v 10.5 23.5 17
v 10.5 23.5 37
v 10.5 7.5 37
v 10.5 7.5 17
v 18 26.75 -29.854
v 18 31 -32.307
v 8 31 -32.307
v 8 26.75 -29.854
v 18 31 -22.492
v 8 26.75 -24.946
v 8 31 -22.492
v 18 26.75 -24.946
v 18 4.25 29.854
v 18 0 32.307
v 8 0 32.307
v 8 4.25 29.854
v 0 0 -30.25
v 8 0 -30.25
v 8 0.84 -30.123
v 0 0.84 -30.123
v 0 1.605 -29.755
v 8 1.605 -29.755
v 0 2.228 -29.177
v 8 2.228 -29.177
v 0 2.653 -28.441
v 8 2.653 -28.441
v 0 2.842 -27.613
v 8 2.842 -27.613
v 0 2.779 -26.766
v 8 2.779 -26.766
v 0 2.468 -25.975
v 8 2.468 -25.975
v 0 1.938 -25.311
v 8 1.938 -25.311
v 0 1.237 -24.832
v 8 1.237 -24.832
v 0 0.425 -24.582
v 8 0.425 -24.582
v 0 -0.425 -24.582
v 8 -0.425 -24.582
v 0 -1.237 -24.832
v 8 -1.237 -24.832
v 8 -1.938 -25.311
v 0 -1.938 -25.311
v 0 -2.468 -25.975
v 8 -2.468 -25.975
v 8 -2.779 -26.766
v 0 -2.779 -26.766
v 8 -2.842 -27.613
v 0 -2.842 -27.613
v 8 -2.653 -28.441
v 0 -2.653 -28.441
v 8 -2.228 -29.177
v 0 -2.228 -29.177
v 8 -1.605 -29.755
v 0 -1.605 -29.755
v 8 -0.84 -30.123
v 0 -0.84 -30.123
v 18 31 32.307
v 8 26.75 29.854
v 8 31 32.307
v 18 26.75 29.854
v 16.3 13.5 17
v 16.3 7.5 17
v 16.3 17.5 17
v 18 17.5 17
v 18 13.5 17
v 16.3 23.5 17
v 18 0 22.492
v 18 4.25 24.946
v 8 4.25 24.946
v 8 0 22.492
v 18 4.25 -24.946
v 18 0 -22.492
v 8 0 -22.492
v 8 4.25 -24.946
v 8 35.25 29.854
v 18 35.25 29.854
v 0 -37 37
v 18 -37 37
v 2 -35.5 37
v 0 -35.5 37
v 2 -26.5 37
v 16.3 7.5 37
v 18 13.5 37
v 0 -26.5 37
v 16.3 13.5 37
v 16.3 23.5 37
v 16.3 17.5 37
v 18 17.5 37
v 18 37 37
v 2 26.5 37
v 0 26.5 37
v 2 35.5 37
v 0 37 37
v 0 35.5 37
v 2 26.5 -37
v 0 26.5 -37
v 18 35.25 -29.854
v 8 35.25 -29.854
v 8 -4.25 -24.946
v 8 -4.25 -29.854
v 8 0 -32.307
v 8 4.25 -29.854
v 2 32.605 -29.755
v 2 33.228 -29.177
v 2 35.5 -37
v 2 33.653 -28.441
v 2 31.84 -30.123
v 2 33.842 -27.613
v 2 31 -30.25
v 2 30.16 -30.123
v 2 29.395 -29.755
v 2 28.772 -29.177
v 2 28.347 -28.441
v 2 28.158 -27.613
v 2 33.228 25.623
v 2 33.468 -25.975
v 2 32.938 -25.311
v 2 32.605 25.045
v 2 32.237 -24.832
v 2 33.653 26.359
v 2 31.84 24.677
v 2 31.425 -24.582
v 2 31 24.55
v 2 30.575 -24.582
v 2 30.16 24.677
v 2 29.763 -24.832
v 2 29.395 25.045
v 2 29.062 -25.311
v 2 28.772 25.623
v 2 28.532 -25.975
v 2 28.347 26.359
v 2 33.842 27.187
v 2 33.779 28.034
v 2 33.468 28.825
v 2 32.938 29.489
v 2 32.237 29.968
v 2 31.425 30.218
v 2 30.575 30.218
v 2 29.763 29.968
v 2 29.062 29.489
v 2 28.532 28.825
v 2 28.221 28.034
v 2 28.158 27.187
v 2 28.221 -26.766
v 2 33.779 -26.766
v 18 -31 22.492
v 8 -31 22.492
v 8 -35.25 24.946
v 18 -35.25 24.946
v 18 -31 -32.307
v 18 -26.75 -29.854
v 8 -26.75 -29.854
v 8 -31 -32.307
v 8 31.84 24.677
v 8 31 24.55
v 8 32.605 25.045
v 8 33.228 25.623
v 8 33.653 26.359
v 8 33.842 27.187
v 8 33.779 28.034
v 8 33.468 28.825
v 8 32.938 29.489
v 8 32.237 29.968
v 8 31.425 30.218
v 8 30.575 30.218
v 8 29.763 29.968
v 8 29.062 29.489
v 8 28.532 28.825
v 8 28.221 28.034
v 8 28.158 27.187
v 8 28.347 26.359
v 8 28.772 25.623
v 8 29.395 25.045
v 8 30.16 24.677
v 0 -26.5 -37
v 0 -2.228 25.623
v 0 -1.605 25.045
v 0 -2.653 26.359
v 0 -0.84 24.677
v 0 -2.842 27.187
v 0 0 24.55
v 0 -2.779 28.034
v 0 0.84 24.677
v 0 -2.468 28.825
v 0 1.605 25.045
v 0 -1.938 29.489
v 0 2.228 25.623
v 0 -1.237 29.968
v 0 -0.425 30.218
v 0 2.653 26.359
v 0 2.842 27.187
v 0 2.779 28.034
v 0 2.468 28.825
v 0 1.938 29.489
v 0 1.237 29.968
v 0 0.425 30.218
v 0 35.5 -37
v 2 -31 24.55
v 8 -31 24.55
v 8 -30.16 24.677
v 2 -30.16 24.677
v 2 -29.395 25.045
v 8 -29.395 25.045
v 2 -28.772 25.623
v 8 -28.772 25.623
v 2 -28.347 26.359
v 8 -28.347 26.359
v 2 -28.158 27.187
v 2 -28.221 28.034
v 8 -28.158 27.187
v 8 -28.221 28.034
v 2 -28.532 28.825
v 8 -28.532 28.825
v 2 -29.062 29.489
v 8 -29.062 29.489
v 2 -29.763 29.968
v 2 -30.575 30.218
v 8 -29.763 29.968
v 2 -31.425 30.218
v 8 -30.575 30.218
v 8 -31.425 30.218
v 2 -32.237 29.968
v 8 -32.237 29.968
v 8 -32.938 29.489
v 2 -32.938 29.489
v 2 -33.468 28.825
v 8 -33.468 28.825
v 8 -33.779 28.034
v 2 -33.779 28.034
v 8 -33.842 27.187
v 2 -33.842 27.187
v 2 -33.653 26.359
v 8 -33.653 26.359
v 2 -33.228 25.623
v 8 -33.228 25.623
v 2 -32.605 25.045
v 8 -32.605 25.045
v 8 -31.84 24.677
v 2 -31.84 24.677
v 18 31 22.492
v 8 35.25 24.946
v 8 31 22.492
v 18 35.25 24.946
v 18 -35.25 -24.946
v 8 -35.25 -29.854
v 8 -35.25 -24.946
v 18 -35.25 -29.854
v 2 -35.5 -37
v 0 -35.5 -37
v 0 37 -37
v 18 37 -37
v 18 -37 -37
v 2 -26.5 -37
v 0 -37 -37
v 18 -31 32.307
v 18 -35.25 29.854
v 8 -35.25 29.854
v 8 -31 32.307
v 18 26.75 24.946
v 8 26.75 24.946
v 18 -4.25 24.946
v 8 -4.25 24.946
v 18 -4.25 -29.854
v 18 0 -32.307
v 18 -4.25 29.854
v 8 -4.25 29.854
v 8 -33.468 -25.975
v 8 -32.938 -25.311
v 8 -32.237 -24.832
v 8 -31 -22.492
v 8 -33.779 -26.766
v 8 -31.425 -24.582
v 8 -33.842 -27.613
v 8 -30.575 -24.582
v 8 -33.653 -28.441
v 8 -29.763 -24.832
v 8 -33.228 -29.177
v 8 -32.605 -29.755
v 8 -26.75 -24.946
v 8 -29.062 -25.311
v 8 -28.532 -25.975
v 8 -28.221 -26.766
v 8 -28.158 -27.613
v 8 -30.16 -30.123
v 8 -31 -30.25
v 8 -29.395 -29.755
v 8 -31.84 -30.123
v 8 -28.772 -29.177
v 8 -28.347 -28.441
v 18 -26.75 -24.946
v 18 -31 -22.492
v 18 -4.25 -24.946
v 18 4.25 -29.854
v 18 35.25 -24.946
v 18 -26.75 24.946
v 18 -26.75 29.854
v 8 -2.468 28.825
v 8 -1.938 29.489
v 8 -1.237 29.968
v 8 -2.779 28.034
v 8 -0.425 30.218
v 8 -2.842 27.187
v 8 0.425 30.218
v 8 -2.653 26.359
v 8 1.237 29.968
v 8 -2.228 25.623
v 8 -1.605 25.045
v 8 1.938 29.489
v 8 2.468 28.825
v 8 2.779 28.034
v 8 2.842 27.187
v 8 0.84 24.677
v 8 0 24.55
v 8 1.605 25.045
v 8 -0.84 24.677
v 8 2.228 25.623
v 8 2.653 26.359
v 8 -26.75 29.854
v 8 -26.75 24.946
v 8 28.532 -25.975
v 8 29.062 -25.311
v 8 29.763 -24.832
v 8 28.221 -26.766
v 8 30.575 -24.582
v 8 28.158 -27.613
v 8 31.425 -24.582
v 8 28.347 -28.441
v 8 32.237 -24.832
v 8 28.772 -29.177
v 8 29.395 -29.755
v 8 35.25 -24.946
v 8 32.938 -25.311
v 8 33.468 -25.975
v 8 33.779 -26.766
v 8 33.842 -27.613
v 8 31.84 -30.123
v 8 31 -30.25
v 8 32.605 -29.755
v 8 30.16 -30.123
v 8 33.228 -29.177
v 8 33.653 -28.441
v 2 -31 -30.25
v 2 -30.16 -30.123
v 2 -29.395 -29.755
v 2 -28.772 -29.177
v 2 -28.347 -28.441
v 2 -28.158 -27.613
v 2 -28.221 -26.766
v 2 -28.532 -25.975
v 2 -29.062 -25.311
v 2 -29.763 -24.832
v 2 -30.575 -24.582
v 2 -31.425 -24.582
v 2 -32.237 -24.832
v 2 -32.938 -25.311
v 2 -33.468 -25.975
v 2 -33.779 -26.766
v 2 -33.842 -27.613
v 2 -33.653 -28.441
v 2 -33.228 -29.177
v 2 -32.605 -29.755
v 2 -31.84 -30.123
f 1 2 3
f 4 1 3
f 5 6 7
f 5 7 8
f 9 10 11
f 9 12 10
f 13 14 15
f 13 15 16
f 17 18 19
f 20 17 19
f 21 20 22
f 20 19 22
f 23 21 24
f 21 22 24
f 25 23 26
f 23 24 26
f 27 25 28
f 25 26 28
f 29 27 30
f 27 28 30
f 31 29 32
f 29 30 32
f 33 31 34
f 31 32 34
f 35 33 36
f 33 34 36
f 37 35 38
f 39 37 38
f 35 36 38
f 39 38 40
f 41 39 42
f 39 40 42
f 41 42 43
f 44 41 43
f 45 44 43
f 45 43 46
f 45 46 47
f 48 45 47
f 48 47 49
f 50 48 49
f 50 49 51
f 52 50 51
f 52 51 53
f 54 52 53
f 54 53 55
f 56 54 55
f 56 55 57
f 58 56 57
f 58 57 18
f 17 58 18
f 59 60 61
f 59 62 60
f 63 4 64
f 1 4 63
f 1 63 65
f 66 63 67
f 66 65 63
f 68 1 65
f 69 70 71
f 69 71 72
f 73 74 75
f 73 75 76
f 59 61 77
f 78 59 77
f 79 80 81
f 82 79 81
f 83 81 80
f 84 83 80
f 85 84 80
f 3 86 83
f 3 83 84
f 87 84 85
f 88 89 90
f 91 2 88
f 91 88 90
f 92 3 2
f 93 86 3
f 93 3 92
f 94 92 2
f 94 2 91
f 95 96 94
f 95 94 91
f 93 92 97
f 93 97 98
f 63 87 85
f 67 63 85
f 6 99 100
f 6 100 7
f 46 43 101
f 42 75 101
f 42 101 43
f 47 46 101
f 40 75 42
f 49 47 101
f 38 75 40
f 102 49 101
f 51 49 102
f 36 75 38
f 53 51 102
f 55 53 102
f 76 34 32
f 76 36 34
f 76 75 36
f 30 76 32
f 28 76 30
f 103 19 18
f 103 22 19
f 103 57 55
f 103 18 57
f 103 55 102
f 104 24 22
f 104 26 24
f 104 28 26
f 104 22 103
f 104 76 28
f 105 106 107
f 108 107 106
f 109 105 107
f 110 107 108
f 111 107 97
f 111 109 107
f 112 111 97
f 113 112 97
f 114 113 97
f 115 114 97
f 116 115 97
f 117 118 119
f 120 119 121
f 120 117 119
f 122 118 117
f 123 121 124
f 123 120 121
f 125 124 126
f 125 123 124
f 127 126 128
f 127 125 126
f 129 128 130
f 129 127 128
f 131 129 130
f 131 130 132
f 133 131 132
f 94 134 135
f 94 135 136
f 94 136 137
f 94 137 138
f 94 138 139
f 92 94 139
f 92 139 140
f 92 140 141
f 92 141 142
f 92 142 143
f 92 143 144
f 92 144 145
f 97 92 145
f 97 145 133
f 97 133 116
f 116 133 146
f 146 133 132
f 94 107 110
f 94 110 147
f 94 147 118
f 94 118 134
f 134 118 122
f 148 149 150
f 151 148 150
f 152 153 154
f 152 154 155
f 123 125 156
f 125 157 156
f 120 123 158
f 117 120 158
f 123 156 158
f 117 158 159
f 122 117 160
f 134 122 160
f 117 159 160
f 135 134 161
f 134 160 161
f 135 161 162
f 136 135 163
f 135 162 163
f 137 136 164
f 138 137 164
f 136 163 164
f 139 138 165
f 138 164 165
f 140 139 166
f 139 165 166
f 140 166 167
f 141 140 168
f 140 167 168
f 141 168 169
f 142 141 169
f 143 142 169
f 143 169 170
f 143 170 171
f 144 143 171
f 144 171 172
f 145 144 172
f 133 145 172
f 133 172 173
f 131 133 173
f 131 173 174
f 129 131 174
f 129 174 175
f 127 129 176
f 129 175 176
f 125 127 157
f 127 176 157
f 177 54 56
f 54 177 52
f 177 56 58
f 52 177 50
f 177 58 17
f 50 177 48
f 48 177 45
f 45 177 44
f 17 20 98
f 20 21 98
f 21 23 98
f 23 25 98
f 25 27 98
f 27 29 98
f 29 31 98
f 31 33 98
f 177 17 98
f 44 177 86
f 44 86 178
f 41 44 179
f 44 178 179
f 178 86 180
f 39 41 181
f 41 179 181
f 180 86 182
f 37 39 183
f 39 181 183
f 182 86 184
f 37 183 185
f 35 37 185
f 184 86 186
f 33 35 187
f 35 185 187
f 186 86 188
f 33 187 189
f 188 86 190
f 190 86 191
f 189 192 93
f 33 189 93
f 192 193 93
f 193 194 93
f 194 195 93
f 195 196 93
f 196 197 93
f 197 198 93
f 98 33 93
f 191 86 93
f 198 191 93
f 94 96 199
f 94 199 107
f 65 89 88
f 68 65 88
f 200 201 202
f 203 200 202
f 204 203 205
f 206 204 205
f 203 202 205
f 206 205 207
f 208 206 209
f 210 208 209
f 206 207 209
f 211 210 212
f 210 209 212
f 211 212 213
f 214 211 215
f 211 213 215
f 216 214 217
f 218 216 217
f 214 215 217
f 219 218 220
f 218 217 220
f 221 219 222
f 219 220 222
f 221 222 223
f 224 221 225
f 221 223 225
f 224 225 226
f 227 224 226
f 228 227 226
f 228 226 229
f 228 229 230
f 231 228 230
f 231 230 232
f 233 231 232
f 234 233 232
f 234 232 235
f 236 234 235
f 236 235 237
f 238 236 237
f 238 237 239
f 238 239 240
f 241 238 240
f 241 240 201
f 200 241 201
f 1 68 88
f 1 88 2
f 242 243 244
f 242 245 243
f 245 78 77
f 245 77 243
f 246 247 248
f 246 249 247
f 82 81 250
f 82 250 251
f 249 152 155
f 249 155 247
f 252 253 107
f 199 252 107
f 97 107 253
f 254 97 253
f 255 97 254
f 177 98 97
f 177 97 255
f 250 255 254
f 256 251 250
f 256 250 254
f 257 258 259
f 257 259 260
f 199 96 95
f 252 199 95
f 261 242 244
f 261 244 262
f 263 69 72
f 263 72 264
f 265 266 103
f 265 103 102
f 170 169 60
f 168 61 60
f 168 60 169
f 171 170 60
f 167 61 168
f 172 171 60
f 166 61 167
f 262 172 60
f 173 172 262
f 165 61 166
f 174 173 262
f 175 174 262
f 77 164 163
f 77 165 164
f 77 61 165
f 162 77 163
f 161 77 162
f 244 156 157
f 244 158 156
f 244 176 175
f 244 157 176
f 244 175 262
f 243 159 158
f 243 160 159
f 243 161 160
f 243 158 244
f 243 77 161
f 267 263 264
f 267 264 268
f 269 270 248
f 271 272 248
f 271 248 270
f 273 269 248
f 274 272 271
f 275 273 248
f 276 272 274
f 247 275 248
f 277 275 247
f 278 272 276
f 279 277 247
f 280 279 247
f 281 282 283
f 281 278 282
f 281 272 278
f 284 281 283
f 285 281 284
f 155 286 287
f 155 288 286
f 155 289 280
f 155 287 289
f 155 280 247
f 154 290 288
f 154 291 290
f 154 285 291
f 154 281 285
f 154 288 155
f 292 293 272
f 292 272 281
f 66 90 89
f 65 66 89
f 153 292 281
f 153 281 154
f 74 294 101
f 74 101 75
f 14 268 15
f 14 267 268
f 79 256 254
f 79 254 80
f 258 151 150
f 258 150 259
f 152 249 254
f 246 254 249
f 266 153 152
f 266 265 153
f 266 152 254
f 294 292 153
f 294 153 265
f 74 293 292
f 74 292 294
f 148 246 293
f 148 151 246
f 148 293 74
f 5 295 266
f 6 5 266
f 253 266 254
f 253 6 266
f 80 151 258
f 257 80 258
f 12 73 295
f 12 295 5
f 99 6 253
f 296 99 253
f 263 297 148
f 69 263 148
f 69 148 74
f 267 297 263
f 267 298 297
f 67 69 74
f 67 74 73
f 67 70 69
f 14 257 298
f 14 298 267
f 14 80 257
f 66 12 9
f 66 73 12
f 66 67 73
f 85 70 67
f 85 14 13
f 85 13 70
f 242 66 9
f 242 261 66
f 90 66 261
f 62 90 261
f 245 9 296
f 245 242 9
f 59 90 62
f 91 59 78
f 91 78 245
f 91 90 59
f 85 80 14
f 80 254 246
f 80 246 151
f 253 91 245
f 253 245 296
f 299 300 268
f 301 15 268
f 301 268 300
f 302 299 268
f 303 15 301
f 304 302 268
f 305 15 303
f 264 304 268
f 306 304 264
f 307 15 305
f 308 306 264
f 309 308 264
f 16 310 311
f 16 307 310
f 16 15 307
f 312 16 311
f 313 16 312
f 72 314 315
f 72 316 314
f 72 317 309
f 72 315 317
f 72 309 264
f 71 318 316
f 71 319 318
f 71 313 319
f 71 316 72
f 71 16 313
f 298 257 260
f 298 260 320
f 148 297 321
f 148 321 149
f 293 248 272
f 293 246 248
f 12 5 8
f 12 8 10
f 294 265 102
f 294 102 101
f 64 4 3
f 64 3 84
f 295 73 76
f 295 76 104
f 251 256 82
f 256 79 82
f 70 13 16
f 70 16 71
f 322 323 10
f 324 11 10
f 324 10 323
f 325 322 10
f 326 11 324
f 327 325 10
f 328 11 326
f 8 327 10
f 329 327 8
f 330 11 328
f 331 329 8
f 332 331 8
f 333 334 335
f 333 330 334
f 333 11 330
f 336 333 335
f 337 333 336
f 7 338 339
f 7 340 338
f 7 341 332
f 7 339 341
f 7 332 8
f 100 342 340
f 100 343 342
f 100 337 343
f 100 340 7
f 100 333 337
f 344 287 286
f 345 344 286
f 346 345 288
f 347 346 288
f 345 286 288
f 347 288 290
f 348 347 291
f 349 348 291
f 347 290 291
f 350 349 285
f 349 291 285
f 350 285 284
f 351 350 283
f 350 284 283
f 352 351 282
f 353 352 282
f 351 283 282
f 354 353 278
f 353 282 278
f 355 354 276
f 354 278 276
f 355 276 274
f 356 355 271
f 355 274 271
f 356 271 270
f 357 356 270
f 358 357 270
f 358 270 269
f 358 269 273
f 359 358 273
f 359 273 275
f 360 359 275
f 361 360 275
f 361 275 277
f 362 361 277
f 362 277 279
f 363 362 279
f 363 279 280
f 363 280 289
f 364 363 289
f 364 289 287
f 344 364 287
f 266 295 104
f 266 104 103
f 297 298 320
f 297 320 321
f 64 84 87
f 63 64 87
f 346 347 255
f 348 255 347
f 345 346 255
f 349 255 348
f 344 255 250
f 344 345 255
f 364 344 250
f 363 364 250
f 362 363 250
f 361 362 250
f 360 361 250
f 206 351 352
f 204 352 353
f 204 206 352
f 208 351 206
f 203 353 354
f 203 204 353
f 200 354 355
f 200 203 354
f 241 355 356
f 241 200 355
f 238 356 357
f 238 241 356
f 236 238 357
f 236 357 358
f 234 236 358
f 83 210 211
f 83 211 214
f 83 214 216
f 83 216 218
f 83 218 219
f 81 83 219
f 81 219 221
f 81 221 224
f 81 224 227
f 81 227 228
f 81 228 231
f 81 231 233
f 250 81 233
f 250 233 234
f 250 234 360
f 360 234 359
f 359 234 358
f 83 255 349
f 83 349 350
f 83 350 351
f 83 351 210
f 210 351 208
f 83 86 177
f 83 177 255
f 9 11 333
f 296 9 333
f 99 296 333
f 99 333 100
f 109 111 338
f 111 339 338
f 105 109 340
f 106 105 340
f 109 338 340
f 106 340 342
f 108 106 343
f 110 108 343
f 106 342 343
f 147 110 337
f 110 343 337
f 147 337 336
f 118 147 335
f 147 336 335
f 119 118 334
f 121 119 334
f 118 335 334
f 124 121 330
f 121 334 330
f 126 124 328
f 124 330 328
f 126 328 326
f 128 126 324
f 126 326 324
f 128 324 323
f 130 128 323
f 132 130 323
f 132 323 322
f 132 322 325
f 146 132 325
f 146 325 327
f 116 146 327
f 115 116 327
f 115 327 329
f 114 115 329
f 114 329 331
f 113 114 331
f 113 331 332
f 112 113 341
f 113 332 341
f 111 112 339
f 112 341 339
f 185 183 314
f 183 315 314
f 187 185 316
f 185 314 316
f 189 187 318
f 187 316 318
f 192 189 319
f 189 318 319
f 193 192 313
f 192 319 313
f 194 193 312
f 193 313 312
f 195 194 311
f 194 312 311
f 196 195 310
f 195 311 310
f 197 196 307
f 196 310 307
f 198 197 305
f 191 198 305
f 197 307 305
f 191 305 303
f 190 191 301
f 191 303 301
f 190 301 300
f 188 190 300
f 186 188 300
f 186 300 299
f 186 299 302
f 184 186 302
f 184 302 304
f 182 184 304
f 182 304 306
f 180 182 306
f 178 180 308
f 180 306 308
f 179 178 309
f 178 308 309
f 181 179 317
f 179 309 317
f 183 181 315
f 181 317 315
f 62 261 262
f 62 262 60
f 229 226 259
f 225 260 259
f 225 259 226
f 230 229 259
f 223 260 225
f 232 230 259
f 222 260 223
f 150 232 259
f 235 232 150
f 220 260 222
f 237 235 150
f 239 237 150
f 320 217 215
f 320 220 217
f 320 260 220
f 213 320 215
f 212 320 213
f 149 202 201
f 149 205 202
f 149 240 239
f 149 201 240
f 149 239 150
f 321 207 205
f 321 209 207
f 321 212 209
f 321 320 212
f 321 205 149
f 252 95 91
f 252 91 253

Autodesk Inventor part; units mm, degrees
ref_plane "YZ Plane" through (0, 0, 0) normal (1, 0, 0) x (0, 1, 0)
ref_plane "XZ Plane" through (0, 0, 0) normal (0, 1, 0) x (-1, 0, 0)
ref_plane "XY Plane" through (0, 0, 0) normal (0, 0, 1) x (1, 0, 0)
sketch "Szkic1" plane through (0, 0, 0) normal (1, 0, 0) x (0, 1, 0)
  line L0 (-37, 37) -> (37, 37)
  line L1 (37, 37) -> (37, -37)
  line L2 (37, -37) -> (-37, -37)
  line L3 (-37, -37) -> (-37, 37)
  line L4 (-37, 37) -> (37, -37) construction
  line L5 (37, 37) -> (-37, -37) construction
  point P0 (0, 0)
  dimension "d0" = 74
  dimension "d1" = 74
extrude "Wyciągnięcie proste1" add sketch "Szkic1" along normal blind 18
sketch "Szkic2" plane through (18, 0, 0) normal (1, 0, 0) x (0, 0, -1)
  circle A0 centre (-27.4, 31) radius 2.85
  line L0 (37, 37) -> (-37, 37) projected
  line L1 (-37, 37) -> (-37, -37) projected
  circle A1 centre (-27.4, 0) radius 2.85
  circle A2 centre (-27.4, -31) radius 2.85
  circle A3 centre (27.4, 31) radius 2.85
  line L2 (37, -37) -> (37, 37) projected
  circle A4 centre (27.4, 0) radius 2.85
  circle A5 centre (27.4, -31) radius 2.85
  line L3 (-29.8537, 35.25) -> (-24.9463, 35.25)
  line L4 (-24.9463, 35.25) -> (-22.4925, 31)
  line L5 (-22.4925, 31) -> (-24.9463, 26.75)
  line L6 (-24.9463, 26.75) -> (-29.8537, 26.75)
  line L7 (-29.8537, 26.75) -> (-32.3075, 31)
  line L8 (-32.3075, 31) -> (-29.8537, 35.25)
  line L9 (-29.8537, 4.25) -> (-24.9463, 4.25)
  line L10 (-24.9463, 4.25) -> (-22.4925, 0)
  line L11 (-22.4925, 0) -> (-24.9463, -4.25)
  line L12 (-24.9463, -4.25) -> (-29.8537, -4.25)
  line L13 (-29.8537, -4.25) -> (-32.3075, 0)
  line L14 (-32.3075, 0) -> (-29.8537, 4.25)
  line L15 (-29.8537, -26.75) -> (-24.9463, -26.75)
  line L16 (-24.9463, -26.75) -> (-22.4925, -31)
  line L17 (-22.4925, -31) -> (-24.9463, -35.25)
  line L18 (-24.9463, -35.25) -> (-29.8537, -35.25)
  line L19 (-29.8537, -35.25) -> (-32.3075, -31)
  line L20 (-32.3075, -31) -> (-29.8537, -26.75)
  line L21 (29.8537, 35.25) -> (32.3075, 31)
  line L22 (32.3075, 31) -> (29.8537, 26.75)
  line L23 (29.8537, 26.75) -> (24.9463, 26.75)
  line L24 (24.9463, 26.75) -> (22.4925, 31)
  line L25 (22.4925, 31) -> (24.9463, 35.25)
  line L26 (24.9463, 35.25) -> (29.8537, 35.25)
  line L27 (29.8537, 4.25) -> (32.3075, 0)
  line L28 (32.3075, 0) -> (29.8537, -4.25)
  line L29 (29.8537, -4.25) -> (24.9463, -4.25)
  line L30 (24.9463, -4.25) -> (22.4925, 0)
  line L31 (22.4925, 0) -> (24.9463, 4.25)
  line L32 (24.9463, 4.25) -> (29.8537, 4.25)
  line L33 (29.8537, -26.75) -> (32.3075, -31)
  line L34 (32.3075, -31) -> (29.8537, -35.25)
  line L35 (29.8537, -35.25) -> (24.9463, -35.25)
  line L36 (24.9463, -35.25) -> (22.4925, -31)
  line L37 (22.4925, -31) -> (24.9463, -26.75)
  line L38 (24.9463, -26.75) -> (29.8537, -26.75)
  point P0 (0, 0)
  point P1 (27.4, -26.75)
  dimension "d4" = 6
  dimension "d5" = 5.7
  dimension "d6" = 9.6
  dimension "d7" = 31
  dimension "d8" = 31
  dimension "d9" = 5.7
  dimension "d10" = 5.7
  dimension "d11" = 9.6
  dimension "d12" = 5.7
  dimension "d13" = 5.7
  dimension "d14" = 5.7
  dimension "d15" = 8.5
  dimension "d16" = 8.5
  dimension "d17" = 8.5
  dimension "d18" = 8.5
  dimension "d19" = 8.5
  dimension "d20" = 8.5
extrude "Wyciągnięcie proste2" cut sketch "Szkic2" against normal through all contours A0 | A1 | A2 | A3 | A4 | A5
extrude "Wyciągnięcie proste3" cut sketch "Szkic2" against normal blind 10 contours A0 | A1 | A2 | A3 | A4 | A5 | L3 L4 L5 L6 L7 L8 | L9 L10 L11 L12 L13 L14 | L15 L16 L17 L18 L19 L20 | L21 L22 L23 L24 L25 L26 | L27 L28 L29 L30 L31 L32 | L33 L34 L35 L36 L37 L38
sketch "Szkic3" plane through (0, -37, 37) normal (0, 0, 1) x (1, 0, 0)
  line L0 (0, 0) -> (0, 74) projected
  line L1 (0, 72.5) -> (2, 72.5)
  line L2 (2, 72.5) -> (2, 63.5)
  line L3 (2, 63.5) -> (0, 63.5)
  line L4 (0, 63.5) -> (0, 72.5)
  line L5 (0, 74) -> (18, 74) projected
  line L6 (0, 10.5) -> (2, 10.5)
  line L7 (2, 10.5) -> (2, 1.5)
  line L8 (2, 1.5) -> (0, 1.5)
  line L9 (0, 1.5) -> (0, 10.5)
  point P0 (0, 37)
  point P1 (0, 1.5)
  point P2 (0, 63.5)
  dimension "d25" = 1.5
  dimension "d26" = 9
  dimension "d27" = 2
  dimension "d28" = 2
  dimension "d29" = 9
  dimension "d30" = 1.5
extrude "Wyciągnięcie proste4" cut sketch "Szkic3" against normal through all
sketch "Szkic4" plane through (0, -37, 37) normal (0, 0, 1) x (1, 0, 0)
  line L0 (10.5, 60.5) -> (10.5, 44.5)
  line L1 (10.5, 44.5) -> (16.3, 44.5)
  line L2 (16.3, 44.5) -> (16.3, 50.5)
  line L3 (16.3, 60.5) -> (10.5, 60.5)
  line L4 (16.3, 50.5) -> (18, 50.5)
  line L5 (18, 50.5) -> (18, 54.5)
  line L6 (18, 54.5) -> (16.3, 54.5)
  line L7 (16.3, 54.5) -> (16.3, 60.5)
  line L8 (16.3, 50.5) -> (16.3, 54.5) construction
  line L9 (18, 74) -> (18, 0) projected
  line L10 (18, 63.75) -> (8, 63.75) projected
  line L11 (18, 63.75) -> (8, 63.75) projected
  point P0 (0, 37)
  dimension "d33" = 5.8
  dimension "d34" = 4
  dimension "d35" = 1.7
  dimension "d36" = 6
  dimension "d37" = 16
  dimension "d38" = 3.25
extrude "Wyciągnięcie proste5" cut sketch "Szkic4" against normal blind 20
properties part number "XItemEndCoverConnector" material "Tworzywo sztuczne ABS"
